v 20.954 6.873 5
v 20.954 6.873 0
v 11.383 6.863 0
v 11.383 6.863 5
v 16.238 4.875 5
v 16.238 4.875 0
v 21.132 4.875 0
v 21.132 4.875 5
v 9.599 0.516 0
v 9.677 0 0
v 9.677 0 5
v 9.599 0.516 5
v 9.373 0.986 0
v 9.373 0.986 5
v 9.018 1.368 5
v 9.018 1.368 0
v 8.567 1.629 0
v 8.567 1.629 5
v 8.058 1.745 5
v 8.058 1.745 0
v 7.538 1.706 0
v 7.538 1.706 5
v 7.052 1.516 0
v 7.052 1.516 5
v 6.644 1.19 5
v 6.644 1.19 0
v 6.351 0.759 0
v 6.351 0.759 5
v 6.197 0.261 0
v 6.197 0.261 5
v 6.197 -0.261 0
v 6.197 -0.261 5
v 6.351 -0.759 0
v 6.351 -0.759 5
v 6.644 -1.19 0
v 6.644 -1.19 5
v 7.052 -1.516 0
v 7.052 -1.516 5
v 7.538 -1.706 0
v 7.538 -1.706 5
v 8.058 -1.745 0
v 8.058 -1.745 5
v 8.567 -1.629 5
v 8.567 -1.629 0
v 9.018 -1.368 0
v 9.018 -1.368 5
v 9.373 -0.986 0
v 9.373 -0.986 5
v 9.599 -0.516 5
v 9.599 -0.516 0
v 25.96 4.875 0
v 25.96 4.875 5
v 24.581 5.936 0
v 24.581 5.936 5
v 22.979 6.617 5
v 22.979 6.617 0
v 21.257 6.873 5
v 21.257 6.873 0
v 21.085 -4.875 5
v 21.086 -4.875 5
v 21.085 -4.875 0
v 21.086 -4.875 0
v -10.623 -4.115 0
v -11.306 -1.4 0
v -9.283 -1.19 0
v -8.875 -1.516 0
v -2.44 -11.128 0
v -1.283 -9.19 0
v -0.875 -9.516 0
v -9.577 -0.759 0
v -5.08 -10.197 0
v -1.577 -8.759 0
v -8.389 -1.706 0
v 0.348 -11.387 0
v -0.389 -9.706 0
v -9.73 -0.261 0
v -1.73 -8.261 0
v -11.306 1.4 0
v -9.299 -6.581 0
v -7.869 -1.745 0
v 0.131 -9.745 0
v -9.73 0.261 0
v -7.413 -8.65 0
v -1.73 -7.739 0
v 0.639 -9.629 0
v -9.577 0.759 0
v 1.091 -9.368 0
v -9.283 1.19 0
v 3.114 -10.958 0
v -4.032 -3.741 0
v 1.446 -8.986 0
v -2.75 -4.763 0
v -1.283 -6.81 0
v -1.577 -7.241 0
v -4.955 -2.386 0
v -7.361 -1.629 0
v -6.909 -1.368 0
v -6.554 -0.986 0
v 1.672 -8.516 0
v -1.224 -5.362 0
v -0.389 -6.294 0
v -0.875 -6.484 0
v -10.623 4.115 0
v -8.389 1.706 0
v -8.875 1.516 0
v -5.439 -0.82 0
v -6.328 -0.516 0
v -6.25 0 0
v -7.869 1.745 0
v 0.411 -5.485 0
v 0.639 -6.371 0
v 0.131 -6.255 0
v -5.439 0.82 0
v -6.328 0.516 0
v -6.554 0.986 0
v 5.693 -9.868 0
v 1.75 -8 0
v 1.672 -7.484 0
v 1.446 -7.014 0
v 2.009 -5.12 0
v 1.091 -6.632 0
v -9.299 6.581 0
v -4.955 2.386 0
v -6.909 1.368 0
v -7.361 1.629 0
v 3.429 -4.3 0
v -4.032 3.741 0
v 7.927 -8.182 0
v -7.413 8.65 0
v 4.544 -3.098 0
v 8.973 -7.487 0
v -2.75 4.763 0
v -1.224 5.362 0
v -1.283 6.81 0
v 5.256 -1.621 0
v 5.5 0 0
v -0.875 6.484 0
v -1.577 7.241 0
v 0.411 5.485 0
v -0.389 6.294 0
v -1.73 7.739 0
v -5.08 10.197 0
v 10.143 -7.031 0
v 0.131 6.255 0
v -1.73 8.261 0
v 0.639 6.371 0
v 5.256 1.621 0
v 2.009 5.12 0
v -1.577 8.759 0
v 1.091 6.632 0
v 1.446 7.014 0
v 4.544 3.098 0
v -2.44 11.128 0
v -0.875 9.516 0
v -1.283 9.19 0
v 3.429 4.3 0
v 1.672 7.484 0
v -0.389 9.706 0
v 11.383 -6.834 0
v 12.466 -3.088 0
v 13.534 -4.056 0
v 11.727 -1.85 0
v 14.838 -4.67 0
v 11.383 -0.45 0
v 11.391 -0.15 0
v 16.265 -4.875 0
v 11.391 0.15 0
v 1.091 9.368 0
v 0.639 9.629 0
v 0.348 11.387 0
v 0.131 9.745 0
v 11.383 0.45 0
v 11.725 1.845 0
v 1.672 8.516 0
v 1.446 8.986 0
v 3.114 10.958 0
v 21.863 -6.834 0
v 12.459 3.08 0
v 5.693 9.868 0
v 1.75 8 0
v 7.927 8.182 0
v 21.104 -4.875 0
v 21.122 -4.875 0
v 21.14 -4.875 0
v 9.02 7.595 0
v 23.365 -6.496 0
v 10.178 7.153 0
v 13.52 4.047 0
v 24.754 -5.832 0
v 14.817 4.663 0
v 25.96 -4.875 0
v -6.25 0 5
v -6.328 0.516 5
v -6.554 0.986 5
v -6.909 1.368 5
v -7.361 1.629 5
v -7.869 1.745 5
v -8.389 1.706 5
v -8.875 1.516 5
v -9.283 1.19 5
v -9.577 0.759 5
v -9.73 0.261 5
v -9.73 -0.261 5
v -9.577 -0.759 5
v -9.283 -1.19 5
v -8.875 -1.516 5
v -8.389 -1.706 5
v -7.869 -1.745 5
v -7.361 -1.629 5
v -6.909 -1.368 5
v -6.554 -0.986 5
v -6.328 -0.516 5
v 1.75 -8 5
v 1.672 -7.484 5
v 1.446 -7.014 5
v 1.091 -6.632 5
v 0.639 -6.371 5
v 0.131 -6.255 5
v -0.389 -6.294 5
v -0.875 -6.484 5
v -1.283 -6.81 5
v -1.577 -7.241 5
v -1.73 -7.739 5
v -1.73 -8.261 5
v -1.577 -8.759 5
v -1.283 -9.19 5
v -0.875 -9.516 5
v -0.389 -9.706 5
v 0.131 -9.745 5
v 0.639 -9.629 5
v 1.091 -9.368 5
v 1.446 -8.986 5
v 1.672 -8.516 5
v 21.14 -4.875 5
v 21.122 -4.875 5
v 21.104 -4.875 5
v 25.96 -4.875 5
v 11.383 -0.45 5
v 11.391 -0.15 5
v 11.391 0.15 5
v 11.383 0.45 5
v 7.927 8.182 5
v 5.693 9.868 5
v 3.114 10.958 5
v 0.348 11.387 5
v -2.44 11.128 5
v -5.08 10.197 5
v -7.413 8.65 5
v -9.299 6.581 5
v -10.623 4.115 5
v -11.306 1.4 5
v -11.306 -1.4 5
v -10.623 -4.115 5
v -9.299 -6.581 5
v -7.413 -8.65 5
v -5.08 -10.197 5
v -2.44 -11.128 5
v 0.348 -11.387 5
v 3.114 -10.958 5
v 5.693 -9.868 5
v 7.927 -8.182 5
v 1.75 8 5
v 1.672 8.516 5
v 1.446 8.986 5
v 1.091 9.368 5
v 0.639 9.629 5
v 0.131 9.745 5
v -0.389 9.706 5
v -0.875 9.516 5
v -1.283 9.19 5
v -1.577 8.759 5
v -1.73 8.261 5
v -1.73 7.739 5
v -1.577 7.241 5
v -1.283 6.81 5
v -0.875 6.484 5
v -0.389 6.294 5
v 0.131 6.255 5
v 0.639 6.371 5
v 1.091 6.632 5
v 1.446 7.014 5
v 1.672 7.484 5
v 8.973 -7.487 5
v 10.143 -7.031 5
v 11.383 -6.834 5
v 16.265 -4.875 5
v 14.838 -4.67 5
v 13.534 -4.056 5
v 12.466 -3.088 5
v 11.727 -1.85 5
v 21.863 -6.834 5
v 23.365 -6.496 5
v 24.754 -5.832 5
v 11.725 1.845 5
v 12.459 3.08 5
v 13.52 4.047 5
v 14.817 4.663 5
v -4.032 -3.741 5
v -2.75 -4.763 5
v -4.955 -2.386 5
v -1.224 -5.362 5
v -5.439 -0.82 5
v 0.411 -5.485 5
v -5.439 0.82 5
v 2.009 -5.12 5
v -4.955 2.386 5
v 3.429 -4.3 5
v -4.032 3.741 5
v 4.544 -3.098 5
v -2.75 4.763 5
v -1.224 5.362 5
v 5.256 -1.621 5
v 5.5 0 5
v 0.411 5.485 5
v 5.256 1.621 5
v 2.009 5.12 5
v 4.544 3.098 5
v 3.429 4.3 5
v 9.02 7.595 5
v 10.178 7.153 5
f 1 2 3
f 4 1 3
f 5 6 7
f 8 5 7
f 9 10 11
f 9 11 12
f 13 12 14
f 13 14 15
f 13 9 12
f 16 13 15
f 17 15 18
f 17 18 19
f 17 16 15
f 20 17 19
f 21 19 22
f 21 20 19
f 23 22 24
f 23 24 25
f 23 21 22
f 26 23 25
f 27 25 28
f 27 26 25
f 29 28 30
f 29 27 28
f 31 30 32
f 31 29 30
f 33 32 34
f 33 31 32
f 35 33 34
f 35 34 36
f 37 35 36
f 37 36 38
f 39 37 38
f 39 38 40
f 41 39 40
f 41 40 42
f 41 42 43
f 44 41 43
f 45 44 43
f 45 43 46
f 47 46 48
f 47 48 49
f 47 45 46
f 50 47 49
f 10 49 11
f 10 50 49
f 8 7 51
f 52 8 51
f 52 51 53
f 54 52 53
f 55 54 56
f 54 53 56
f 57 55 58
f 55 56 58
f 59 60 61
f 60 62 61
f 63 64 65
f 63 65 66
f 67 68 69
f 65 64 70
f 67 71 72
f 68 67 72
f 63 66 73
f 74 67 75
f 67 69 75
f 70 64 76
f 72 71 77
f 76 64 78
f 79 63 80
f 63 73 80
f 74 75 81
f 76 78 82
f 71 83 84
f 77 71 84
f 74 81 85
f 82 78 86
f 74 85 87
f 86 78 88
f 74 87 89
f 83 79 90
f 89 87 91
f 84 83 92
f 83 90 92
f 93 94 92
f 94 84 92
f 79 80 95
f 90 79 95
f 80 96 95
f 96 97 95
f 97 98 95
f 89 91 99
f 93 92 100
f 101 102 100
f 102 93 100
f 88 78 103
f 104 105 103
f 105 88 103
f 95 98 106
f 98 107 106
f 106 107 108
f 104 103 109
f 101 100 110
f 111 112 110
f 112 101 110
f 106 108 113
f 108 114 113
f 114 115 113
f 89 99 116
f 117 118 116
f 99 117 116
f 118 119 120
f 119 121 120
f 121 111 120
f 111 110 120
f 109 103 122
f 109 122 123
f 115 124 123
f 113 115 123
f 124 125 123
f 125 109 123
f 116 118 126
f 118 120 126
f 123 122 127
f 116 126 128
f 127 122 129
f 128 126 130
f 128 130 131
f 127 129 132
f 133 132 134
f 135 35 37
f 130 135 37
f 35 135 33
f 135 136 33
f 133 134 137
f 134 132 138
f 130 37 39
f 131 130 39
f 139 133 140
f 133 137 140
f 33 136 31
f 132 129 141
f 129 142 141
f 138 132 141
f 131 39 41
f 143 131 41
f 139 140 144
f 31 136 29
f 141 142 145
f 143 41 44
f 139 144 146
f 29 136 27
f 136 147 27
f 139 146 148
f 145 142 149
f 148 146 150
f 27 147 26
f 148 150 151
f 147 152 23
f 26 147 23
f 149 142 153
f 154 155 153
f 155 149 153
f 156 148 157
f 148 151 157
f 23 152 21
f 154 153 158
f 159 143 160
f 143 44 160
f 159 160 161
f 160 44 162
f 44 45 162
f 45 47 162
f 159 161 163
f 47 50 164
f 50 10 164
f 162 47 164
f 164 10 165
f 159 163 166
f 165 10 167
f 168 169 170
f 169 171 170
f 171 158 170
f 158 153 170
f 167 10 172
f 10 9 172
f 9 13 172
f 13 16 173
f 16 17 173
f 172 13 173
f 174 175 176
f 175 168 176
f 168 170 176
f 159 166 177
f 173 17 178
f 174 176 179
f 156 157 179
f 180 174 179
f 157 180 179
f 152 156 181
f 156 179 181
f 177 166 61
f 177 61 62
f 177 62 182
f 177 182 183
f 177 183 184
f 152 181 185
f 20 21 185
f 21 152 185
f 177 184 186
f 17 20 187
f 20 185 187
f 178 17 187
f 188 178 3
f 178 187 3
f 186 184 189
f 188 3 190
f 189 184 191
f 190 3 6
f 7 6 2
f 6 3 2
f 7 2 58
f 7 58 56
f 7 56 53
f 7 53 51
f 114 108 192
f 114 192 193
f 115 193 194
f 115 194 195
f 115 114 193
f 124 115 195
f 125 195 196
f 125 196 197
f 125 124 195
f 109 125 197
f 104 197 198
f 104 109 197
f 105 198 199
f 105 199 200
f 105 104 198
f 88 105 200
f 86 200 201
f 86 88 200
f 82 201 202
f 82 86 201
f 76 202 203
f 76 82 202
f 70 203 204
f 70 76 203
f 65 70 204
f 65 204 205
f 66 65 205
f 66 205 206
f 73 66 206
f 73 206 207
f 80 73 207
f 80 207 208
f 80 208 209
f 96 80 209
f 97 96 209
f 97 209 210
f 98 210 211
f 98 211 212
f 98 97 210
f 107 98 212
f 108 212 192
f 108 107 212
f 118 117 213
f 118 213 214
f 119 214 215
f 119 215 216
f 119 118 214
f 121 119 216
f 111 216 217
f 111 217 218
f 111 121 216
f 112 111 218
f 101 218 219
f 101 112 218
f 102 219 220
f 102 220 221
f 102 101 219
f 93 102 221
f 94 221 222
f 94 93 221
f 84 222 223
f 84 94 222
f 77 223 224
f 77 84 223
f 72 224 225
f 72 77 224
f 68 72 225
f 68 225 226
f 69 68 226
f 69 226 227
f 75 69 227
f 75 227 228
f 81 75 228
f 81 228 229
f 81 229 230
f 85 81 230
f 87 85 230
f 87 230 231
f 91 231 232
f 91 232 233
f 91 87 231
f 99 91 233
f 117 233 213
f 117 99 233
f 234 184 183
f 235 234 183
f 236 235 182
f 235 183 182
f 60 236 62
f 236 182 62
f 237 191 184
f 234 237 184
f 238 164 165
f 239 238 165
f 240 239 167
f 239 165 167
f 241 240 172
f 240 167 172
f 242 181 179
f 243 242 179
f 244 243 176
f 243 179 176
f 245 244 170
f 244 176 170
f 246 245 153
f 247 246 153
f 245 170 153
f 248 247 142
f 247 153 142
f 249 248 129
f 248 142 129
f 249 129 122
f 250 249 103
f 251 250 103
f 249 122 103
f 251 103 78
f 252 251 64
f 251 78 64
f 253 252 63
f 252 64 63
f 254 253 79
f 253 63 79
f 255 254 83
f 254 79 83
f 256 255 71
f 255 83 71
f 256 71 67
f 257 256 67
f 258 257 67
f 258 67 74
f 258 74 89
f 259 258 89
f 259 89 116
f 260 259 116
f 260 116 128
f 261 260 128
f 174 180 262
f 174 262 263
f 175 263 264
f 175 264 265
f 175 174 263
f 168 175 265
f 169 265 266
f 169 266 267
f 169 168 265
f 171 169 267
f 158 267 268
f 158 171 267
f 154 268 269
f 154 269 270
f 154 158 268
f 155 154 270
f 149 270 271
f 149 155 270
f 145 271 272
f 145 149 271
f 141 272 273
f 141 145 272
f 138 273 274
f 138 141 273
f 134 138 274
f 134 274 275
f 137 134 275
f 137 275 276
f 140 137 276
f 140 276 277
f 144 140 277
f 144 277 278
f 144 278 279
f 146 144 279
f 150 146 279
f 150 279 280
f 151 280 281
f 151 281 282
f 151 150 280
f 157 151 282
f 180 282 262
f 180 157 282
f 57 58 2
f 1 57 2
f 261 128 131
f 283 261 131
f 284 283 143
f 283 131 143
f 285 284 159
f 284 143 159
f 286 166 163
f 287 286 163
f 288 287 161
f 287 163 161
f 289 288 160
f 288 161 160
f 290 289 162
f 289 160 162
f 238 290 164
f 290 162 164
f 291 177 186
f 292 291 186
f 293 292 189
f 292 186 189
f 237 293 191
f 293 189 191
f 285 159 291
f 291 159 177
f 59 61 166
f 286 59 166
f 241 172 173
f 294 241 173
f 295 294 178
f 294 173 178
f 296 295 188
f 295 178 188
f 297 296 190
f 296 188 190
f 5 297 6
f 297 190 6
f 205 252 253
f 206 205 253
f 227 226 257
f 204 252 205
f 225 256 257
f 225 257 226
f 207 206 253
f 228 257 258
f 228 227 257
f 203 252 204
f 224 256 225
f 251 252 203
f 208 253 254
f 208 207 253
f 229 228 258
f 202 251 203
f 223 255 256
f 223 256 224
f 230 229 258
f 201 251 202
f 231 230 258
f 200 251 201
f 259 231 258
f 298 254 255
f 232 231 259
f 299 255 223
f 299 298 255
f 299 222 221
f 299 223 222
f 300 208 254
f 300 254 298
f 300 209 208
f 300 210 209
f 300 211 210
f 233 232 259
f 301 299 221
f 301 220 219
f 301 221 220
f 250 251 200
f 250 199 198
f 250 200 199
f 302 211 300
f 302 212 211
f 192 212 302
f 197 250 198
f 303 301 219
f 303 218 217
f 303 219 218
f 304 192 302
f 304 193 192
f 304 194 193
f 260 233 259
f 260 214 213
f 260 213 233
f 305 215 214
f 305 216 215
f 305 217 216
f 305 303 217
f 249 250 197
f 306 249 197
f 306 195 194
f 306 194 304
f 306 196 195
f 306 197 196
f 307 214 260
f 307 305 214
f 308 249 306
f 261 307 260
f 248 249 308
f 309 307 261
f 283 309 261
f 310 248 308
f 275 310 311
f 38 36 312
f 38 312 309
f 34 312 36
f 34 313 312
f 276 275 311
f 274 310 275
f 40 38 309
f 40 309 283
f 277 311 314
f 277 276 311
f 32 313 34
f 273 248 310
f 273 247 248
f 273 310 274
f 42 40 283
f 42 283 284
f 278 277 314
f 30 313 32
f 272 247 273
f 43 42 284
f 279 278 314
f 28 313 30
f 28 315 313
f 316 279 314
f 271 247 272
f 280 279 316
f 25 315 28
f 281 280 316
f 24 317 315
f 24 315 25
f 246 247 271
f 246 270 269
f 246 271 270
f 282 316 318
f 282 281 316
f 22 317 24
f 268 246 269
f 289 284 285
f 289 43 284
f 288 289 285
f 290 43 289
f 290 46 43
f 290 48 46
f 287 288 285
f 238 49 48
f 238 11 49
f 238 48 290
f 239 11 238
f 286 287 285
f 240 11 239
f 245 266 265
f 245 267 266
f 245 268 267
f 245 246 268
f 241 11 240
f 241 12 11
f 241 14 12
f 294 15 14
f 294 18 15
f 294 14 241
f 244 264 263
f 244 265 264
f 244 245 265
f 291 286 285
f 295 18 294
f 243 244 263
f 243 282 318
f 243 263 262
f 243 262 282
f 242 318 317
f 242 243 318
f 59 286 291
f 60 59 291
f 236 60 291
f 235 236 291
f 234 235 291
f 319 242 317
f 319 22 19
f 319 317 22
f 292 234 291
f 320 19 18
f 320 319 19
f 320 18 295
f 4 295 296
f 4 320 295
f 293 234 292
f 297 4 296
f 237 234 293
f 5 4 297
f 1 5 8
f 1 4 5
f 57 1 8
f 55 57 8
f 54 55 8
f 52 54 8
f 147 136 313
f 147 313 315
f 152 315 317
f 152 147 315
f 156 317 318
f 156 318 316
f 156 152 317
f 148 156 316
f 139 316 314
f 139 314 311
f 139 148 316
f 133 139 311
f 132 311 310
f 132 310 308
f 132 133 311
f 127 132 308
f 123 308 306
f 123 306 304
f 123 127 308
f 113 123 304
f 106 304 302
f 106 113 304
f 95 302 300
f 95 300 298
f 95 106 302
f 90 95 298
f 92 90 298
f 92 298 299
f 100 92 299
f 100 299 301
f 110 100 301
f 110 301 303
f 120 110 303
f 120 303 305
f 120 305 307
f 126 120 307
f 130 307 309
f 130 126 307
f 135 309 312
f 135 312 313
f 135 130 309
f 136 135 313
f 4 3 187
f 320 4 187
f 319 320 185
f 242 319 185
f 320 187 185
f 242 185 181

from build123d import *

# Parameters (mm, degrees)
F0_R     = 1.75
F0_R_2   = 5.5
F1_DEPTH = 5


# Not quite as in the source:
# - ends of sketch curves that miss each other by under 0.0002 mm in the source are joined


with BuildPart() as f1:
    # F0 (on Top) → F1 (new body)
    with BuildSketch(Plane.XY):
        with BuildLine():
            ThreePointArc((11.3834703749, 6.8633075193), (9.5916723545, 7.355768815), (7.9272258947, 8.1820110654))
            ThreePointArc((7.9272258947, 8.1820110654), (-11.3923753212, 0), (7.9272258947, -8.1820110654))
            ThreePointArc((7.9272258947, -8.1820110654), (9.5459951376, -7.2276126539), (11.3834703749, -6.8339440851))
            Line((11.3834703749, -6.8339440851), (21.8628461179, -6.8339440851))
            ThreePointArc((21.8628461179, -6.8339440851), (24.0780549828, -6.2025675349), (25.9603803998, -4.874923875))
            Line((25.9603803998, -4.874923875), (21.1398675793, -4.874923875))
            ThreePointArc((21.1398675793, -4.874923875), (21.1127528894, -4.8749999983), (21.0856381954, -4.8749253089))
            ThreePointArc((21.0856381954, -4.8749253089), (21.0855085866, -4.8749245897), (21.0853803998, -4.874923875))
            Line((21.0853803998, -4.874923875), (16.2648675793, -4.874923875))
            ThreePointArc((16.2648675793, -4.874923875), (12.9636398268, -3.6120150473), (11.3834703749, -0.4503528446))
            ThreePointArc((11.3834703749, -0.4503528446), (11.3923753212, 0), (11.3834703749, 0.4503528446))
            ThreePointArc((11.3834703749, 0.4503528446), (12.9535739288, 3.6028655537), (16.2376621588, 4.8749999999))
            Line((16.2376621588, 4.8749999999), (21.1319533126, 4.8749616796))
            Line((21.1319533126, 4.8749616796), (25.9603803998, 4.874923875))
            ThreePointArc((25.9603803998, 4.874923875), (23.8013578283, 6.3274272295), (21.2571545841, 6.8734806254))
            Line((21.2571545841, 6.8734806254), (20.9539298759, 6.8731682053))
            Line((20.9539298759, 6.8731682053), (11.3834703749, 6.8633075193))
        make_face()
        with Locations((0, -8)):
            Circle(F0_R, mode=Mode.SUBTRACT)
        with Locations((-8, 0)):
            Circle(F0_R, mode=Mode.SUBTRACT)
        Circle(F0_R_2, mode=Mode.SUBTRACT)
        with Locations((7.9272258947, 0)):
            Circle(F0_R, mode=Mode.SUBTRACT)
        with Locations((0, 8)):
            Circle(F0_R, mode=Mode.SUBTRACT)
    extrude(amount=F1_DEPTH)


solid = f1.part
